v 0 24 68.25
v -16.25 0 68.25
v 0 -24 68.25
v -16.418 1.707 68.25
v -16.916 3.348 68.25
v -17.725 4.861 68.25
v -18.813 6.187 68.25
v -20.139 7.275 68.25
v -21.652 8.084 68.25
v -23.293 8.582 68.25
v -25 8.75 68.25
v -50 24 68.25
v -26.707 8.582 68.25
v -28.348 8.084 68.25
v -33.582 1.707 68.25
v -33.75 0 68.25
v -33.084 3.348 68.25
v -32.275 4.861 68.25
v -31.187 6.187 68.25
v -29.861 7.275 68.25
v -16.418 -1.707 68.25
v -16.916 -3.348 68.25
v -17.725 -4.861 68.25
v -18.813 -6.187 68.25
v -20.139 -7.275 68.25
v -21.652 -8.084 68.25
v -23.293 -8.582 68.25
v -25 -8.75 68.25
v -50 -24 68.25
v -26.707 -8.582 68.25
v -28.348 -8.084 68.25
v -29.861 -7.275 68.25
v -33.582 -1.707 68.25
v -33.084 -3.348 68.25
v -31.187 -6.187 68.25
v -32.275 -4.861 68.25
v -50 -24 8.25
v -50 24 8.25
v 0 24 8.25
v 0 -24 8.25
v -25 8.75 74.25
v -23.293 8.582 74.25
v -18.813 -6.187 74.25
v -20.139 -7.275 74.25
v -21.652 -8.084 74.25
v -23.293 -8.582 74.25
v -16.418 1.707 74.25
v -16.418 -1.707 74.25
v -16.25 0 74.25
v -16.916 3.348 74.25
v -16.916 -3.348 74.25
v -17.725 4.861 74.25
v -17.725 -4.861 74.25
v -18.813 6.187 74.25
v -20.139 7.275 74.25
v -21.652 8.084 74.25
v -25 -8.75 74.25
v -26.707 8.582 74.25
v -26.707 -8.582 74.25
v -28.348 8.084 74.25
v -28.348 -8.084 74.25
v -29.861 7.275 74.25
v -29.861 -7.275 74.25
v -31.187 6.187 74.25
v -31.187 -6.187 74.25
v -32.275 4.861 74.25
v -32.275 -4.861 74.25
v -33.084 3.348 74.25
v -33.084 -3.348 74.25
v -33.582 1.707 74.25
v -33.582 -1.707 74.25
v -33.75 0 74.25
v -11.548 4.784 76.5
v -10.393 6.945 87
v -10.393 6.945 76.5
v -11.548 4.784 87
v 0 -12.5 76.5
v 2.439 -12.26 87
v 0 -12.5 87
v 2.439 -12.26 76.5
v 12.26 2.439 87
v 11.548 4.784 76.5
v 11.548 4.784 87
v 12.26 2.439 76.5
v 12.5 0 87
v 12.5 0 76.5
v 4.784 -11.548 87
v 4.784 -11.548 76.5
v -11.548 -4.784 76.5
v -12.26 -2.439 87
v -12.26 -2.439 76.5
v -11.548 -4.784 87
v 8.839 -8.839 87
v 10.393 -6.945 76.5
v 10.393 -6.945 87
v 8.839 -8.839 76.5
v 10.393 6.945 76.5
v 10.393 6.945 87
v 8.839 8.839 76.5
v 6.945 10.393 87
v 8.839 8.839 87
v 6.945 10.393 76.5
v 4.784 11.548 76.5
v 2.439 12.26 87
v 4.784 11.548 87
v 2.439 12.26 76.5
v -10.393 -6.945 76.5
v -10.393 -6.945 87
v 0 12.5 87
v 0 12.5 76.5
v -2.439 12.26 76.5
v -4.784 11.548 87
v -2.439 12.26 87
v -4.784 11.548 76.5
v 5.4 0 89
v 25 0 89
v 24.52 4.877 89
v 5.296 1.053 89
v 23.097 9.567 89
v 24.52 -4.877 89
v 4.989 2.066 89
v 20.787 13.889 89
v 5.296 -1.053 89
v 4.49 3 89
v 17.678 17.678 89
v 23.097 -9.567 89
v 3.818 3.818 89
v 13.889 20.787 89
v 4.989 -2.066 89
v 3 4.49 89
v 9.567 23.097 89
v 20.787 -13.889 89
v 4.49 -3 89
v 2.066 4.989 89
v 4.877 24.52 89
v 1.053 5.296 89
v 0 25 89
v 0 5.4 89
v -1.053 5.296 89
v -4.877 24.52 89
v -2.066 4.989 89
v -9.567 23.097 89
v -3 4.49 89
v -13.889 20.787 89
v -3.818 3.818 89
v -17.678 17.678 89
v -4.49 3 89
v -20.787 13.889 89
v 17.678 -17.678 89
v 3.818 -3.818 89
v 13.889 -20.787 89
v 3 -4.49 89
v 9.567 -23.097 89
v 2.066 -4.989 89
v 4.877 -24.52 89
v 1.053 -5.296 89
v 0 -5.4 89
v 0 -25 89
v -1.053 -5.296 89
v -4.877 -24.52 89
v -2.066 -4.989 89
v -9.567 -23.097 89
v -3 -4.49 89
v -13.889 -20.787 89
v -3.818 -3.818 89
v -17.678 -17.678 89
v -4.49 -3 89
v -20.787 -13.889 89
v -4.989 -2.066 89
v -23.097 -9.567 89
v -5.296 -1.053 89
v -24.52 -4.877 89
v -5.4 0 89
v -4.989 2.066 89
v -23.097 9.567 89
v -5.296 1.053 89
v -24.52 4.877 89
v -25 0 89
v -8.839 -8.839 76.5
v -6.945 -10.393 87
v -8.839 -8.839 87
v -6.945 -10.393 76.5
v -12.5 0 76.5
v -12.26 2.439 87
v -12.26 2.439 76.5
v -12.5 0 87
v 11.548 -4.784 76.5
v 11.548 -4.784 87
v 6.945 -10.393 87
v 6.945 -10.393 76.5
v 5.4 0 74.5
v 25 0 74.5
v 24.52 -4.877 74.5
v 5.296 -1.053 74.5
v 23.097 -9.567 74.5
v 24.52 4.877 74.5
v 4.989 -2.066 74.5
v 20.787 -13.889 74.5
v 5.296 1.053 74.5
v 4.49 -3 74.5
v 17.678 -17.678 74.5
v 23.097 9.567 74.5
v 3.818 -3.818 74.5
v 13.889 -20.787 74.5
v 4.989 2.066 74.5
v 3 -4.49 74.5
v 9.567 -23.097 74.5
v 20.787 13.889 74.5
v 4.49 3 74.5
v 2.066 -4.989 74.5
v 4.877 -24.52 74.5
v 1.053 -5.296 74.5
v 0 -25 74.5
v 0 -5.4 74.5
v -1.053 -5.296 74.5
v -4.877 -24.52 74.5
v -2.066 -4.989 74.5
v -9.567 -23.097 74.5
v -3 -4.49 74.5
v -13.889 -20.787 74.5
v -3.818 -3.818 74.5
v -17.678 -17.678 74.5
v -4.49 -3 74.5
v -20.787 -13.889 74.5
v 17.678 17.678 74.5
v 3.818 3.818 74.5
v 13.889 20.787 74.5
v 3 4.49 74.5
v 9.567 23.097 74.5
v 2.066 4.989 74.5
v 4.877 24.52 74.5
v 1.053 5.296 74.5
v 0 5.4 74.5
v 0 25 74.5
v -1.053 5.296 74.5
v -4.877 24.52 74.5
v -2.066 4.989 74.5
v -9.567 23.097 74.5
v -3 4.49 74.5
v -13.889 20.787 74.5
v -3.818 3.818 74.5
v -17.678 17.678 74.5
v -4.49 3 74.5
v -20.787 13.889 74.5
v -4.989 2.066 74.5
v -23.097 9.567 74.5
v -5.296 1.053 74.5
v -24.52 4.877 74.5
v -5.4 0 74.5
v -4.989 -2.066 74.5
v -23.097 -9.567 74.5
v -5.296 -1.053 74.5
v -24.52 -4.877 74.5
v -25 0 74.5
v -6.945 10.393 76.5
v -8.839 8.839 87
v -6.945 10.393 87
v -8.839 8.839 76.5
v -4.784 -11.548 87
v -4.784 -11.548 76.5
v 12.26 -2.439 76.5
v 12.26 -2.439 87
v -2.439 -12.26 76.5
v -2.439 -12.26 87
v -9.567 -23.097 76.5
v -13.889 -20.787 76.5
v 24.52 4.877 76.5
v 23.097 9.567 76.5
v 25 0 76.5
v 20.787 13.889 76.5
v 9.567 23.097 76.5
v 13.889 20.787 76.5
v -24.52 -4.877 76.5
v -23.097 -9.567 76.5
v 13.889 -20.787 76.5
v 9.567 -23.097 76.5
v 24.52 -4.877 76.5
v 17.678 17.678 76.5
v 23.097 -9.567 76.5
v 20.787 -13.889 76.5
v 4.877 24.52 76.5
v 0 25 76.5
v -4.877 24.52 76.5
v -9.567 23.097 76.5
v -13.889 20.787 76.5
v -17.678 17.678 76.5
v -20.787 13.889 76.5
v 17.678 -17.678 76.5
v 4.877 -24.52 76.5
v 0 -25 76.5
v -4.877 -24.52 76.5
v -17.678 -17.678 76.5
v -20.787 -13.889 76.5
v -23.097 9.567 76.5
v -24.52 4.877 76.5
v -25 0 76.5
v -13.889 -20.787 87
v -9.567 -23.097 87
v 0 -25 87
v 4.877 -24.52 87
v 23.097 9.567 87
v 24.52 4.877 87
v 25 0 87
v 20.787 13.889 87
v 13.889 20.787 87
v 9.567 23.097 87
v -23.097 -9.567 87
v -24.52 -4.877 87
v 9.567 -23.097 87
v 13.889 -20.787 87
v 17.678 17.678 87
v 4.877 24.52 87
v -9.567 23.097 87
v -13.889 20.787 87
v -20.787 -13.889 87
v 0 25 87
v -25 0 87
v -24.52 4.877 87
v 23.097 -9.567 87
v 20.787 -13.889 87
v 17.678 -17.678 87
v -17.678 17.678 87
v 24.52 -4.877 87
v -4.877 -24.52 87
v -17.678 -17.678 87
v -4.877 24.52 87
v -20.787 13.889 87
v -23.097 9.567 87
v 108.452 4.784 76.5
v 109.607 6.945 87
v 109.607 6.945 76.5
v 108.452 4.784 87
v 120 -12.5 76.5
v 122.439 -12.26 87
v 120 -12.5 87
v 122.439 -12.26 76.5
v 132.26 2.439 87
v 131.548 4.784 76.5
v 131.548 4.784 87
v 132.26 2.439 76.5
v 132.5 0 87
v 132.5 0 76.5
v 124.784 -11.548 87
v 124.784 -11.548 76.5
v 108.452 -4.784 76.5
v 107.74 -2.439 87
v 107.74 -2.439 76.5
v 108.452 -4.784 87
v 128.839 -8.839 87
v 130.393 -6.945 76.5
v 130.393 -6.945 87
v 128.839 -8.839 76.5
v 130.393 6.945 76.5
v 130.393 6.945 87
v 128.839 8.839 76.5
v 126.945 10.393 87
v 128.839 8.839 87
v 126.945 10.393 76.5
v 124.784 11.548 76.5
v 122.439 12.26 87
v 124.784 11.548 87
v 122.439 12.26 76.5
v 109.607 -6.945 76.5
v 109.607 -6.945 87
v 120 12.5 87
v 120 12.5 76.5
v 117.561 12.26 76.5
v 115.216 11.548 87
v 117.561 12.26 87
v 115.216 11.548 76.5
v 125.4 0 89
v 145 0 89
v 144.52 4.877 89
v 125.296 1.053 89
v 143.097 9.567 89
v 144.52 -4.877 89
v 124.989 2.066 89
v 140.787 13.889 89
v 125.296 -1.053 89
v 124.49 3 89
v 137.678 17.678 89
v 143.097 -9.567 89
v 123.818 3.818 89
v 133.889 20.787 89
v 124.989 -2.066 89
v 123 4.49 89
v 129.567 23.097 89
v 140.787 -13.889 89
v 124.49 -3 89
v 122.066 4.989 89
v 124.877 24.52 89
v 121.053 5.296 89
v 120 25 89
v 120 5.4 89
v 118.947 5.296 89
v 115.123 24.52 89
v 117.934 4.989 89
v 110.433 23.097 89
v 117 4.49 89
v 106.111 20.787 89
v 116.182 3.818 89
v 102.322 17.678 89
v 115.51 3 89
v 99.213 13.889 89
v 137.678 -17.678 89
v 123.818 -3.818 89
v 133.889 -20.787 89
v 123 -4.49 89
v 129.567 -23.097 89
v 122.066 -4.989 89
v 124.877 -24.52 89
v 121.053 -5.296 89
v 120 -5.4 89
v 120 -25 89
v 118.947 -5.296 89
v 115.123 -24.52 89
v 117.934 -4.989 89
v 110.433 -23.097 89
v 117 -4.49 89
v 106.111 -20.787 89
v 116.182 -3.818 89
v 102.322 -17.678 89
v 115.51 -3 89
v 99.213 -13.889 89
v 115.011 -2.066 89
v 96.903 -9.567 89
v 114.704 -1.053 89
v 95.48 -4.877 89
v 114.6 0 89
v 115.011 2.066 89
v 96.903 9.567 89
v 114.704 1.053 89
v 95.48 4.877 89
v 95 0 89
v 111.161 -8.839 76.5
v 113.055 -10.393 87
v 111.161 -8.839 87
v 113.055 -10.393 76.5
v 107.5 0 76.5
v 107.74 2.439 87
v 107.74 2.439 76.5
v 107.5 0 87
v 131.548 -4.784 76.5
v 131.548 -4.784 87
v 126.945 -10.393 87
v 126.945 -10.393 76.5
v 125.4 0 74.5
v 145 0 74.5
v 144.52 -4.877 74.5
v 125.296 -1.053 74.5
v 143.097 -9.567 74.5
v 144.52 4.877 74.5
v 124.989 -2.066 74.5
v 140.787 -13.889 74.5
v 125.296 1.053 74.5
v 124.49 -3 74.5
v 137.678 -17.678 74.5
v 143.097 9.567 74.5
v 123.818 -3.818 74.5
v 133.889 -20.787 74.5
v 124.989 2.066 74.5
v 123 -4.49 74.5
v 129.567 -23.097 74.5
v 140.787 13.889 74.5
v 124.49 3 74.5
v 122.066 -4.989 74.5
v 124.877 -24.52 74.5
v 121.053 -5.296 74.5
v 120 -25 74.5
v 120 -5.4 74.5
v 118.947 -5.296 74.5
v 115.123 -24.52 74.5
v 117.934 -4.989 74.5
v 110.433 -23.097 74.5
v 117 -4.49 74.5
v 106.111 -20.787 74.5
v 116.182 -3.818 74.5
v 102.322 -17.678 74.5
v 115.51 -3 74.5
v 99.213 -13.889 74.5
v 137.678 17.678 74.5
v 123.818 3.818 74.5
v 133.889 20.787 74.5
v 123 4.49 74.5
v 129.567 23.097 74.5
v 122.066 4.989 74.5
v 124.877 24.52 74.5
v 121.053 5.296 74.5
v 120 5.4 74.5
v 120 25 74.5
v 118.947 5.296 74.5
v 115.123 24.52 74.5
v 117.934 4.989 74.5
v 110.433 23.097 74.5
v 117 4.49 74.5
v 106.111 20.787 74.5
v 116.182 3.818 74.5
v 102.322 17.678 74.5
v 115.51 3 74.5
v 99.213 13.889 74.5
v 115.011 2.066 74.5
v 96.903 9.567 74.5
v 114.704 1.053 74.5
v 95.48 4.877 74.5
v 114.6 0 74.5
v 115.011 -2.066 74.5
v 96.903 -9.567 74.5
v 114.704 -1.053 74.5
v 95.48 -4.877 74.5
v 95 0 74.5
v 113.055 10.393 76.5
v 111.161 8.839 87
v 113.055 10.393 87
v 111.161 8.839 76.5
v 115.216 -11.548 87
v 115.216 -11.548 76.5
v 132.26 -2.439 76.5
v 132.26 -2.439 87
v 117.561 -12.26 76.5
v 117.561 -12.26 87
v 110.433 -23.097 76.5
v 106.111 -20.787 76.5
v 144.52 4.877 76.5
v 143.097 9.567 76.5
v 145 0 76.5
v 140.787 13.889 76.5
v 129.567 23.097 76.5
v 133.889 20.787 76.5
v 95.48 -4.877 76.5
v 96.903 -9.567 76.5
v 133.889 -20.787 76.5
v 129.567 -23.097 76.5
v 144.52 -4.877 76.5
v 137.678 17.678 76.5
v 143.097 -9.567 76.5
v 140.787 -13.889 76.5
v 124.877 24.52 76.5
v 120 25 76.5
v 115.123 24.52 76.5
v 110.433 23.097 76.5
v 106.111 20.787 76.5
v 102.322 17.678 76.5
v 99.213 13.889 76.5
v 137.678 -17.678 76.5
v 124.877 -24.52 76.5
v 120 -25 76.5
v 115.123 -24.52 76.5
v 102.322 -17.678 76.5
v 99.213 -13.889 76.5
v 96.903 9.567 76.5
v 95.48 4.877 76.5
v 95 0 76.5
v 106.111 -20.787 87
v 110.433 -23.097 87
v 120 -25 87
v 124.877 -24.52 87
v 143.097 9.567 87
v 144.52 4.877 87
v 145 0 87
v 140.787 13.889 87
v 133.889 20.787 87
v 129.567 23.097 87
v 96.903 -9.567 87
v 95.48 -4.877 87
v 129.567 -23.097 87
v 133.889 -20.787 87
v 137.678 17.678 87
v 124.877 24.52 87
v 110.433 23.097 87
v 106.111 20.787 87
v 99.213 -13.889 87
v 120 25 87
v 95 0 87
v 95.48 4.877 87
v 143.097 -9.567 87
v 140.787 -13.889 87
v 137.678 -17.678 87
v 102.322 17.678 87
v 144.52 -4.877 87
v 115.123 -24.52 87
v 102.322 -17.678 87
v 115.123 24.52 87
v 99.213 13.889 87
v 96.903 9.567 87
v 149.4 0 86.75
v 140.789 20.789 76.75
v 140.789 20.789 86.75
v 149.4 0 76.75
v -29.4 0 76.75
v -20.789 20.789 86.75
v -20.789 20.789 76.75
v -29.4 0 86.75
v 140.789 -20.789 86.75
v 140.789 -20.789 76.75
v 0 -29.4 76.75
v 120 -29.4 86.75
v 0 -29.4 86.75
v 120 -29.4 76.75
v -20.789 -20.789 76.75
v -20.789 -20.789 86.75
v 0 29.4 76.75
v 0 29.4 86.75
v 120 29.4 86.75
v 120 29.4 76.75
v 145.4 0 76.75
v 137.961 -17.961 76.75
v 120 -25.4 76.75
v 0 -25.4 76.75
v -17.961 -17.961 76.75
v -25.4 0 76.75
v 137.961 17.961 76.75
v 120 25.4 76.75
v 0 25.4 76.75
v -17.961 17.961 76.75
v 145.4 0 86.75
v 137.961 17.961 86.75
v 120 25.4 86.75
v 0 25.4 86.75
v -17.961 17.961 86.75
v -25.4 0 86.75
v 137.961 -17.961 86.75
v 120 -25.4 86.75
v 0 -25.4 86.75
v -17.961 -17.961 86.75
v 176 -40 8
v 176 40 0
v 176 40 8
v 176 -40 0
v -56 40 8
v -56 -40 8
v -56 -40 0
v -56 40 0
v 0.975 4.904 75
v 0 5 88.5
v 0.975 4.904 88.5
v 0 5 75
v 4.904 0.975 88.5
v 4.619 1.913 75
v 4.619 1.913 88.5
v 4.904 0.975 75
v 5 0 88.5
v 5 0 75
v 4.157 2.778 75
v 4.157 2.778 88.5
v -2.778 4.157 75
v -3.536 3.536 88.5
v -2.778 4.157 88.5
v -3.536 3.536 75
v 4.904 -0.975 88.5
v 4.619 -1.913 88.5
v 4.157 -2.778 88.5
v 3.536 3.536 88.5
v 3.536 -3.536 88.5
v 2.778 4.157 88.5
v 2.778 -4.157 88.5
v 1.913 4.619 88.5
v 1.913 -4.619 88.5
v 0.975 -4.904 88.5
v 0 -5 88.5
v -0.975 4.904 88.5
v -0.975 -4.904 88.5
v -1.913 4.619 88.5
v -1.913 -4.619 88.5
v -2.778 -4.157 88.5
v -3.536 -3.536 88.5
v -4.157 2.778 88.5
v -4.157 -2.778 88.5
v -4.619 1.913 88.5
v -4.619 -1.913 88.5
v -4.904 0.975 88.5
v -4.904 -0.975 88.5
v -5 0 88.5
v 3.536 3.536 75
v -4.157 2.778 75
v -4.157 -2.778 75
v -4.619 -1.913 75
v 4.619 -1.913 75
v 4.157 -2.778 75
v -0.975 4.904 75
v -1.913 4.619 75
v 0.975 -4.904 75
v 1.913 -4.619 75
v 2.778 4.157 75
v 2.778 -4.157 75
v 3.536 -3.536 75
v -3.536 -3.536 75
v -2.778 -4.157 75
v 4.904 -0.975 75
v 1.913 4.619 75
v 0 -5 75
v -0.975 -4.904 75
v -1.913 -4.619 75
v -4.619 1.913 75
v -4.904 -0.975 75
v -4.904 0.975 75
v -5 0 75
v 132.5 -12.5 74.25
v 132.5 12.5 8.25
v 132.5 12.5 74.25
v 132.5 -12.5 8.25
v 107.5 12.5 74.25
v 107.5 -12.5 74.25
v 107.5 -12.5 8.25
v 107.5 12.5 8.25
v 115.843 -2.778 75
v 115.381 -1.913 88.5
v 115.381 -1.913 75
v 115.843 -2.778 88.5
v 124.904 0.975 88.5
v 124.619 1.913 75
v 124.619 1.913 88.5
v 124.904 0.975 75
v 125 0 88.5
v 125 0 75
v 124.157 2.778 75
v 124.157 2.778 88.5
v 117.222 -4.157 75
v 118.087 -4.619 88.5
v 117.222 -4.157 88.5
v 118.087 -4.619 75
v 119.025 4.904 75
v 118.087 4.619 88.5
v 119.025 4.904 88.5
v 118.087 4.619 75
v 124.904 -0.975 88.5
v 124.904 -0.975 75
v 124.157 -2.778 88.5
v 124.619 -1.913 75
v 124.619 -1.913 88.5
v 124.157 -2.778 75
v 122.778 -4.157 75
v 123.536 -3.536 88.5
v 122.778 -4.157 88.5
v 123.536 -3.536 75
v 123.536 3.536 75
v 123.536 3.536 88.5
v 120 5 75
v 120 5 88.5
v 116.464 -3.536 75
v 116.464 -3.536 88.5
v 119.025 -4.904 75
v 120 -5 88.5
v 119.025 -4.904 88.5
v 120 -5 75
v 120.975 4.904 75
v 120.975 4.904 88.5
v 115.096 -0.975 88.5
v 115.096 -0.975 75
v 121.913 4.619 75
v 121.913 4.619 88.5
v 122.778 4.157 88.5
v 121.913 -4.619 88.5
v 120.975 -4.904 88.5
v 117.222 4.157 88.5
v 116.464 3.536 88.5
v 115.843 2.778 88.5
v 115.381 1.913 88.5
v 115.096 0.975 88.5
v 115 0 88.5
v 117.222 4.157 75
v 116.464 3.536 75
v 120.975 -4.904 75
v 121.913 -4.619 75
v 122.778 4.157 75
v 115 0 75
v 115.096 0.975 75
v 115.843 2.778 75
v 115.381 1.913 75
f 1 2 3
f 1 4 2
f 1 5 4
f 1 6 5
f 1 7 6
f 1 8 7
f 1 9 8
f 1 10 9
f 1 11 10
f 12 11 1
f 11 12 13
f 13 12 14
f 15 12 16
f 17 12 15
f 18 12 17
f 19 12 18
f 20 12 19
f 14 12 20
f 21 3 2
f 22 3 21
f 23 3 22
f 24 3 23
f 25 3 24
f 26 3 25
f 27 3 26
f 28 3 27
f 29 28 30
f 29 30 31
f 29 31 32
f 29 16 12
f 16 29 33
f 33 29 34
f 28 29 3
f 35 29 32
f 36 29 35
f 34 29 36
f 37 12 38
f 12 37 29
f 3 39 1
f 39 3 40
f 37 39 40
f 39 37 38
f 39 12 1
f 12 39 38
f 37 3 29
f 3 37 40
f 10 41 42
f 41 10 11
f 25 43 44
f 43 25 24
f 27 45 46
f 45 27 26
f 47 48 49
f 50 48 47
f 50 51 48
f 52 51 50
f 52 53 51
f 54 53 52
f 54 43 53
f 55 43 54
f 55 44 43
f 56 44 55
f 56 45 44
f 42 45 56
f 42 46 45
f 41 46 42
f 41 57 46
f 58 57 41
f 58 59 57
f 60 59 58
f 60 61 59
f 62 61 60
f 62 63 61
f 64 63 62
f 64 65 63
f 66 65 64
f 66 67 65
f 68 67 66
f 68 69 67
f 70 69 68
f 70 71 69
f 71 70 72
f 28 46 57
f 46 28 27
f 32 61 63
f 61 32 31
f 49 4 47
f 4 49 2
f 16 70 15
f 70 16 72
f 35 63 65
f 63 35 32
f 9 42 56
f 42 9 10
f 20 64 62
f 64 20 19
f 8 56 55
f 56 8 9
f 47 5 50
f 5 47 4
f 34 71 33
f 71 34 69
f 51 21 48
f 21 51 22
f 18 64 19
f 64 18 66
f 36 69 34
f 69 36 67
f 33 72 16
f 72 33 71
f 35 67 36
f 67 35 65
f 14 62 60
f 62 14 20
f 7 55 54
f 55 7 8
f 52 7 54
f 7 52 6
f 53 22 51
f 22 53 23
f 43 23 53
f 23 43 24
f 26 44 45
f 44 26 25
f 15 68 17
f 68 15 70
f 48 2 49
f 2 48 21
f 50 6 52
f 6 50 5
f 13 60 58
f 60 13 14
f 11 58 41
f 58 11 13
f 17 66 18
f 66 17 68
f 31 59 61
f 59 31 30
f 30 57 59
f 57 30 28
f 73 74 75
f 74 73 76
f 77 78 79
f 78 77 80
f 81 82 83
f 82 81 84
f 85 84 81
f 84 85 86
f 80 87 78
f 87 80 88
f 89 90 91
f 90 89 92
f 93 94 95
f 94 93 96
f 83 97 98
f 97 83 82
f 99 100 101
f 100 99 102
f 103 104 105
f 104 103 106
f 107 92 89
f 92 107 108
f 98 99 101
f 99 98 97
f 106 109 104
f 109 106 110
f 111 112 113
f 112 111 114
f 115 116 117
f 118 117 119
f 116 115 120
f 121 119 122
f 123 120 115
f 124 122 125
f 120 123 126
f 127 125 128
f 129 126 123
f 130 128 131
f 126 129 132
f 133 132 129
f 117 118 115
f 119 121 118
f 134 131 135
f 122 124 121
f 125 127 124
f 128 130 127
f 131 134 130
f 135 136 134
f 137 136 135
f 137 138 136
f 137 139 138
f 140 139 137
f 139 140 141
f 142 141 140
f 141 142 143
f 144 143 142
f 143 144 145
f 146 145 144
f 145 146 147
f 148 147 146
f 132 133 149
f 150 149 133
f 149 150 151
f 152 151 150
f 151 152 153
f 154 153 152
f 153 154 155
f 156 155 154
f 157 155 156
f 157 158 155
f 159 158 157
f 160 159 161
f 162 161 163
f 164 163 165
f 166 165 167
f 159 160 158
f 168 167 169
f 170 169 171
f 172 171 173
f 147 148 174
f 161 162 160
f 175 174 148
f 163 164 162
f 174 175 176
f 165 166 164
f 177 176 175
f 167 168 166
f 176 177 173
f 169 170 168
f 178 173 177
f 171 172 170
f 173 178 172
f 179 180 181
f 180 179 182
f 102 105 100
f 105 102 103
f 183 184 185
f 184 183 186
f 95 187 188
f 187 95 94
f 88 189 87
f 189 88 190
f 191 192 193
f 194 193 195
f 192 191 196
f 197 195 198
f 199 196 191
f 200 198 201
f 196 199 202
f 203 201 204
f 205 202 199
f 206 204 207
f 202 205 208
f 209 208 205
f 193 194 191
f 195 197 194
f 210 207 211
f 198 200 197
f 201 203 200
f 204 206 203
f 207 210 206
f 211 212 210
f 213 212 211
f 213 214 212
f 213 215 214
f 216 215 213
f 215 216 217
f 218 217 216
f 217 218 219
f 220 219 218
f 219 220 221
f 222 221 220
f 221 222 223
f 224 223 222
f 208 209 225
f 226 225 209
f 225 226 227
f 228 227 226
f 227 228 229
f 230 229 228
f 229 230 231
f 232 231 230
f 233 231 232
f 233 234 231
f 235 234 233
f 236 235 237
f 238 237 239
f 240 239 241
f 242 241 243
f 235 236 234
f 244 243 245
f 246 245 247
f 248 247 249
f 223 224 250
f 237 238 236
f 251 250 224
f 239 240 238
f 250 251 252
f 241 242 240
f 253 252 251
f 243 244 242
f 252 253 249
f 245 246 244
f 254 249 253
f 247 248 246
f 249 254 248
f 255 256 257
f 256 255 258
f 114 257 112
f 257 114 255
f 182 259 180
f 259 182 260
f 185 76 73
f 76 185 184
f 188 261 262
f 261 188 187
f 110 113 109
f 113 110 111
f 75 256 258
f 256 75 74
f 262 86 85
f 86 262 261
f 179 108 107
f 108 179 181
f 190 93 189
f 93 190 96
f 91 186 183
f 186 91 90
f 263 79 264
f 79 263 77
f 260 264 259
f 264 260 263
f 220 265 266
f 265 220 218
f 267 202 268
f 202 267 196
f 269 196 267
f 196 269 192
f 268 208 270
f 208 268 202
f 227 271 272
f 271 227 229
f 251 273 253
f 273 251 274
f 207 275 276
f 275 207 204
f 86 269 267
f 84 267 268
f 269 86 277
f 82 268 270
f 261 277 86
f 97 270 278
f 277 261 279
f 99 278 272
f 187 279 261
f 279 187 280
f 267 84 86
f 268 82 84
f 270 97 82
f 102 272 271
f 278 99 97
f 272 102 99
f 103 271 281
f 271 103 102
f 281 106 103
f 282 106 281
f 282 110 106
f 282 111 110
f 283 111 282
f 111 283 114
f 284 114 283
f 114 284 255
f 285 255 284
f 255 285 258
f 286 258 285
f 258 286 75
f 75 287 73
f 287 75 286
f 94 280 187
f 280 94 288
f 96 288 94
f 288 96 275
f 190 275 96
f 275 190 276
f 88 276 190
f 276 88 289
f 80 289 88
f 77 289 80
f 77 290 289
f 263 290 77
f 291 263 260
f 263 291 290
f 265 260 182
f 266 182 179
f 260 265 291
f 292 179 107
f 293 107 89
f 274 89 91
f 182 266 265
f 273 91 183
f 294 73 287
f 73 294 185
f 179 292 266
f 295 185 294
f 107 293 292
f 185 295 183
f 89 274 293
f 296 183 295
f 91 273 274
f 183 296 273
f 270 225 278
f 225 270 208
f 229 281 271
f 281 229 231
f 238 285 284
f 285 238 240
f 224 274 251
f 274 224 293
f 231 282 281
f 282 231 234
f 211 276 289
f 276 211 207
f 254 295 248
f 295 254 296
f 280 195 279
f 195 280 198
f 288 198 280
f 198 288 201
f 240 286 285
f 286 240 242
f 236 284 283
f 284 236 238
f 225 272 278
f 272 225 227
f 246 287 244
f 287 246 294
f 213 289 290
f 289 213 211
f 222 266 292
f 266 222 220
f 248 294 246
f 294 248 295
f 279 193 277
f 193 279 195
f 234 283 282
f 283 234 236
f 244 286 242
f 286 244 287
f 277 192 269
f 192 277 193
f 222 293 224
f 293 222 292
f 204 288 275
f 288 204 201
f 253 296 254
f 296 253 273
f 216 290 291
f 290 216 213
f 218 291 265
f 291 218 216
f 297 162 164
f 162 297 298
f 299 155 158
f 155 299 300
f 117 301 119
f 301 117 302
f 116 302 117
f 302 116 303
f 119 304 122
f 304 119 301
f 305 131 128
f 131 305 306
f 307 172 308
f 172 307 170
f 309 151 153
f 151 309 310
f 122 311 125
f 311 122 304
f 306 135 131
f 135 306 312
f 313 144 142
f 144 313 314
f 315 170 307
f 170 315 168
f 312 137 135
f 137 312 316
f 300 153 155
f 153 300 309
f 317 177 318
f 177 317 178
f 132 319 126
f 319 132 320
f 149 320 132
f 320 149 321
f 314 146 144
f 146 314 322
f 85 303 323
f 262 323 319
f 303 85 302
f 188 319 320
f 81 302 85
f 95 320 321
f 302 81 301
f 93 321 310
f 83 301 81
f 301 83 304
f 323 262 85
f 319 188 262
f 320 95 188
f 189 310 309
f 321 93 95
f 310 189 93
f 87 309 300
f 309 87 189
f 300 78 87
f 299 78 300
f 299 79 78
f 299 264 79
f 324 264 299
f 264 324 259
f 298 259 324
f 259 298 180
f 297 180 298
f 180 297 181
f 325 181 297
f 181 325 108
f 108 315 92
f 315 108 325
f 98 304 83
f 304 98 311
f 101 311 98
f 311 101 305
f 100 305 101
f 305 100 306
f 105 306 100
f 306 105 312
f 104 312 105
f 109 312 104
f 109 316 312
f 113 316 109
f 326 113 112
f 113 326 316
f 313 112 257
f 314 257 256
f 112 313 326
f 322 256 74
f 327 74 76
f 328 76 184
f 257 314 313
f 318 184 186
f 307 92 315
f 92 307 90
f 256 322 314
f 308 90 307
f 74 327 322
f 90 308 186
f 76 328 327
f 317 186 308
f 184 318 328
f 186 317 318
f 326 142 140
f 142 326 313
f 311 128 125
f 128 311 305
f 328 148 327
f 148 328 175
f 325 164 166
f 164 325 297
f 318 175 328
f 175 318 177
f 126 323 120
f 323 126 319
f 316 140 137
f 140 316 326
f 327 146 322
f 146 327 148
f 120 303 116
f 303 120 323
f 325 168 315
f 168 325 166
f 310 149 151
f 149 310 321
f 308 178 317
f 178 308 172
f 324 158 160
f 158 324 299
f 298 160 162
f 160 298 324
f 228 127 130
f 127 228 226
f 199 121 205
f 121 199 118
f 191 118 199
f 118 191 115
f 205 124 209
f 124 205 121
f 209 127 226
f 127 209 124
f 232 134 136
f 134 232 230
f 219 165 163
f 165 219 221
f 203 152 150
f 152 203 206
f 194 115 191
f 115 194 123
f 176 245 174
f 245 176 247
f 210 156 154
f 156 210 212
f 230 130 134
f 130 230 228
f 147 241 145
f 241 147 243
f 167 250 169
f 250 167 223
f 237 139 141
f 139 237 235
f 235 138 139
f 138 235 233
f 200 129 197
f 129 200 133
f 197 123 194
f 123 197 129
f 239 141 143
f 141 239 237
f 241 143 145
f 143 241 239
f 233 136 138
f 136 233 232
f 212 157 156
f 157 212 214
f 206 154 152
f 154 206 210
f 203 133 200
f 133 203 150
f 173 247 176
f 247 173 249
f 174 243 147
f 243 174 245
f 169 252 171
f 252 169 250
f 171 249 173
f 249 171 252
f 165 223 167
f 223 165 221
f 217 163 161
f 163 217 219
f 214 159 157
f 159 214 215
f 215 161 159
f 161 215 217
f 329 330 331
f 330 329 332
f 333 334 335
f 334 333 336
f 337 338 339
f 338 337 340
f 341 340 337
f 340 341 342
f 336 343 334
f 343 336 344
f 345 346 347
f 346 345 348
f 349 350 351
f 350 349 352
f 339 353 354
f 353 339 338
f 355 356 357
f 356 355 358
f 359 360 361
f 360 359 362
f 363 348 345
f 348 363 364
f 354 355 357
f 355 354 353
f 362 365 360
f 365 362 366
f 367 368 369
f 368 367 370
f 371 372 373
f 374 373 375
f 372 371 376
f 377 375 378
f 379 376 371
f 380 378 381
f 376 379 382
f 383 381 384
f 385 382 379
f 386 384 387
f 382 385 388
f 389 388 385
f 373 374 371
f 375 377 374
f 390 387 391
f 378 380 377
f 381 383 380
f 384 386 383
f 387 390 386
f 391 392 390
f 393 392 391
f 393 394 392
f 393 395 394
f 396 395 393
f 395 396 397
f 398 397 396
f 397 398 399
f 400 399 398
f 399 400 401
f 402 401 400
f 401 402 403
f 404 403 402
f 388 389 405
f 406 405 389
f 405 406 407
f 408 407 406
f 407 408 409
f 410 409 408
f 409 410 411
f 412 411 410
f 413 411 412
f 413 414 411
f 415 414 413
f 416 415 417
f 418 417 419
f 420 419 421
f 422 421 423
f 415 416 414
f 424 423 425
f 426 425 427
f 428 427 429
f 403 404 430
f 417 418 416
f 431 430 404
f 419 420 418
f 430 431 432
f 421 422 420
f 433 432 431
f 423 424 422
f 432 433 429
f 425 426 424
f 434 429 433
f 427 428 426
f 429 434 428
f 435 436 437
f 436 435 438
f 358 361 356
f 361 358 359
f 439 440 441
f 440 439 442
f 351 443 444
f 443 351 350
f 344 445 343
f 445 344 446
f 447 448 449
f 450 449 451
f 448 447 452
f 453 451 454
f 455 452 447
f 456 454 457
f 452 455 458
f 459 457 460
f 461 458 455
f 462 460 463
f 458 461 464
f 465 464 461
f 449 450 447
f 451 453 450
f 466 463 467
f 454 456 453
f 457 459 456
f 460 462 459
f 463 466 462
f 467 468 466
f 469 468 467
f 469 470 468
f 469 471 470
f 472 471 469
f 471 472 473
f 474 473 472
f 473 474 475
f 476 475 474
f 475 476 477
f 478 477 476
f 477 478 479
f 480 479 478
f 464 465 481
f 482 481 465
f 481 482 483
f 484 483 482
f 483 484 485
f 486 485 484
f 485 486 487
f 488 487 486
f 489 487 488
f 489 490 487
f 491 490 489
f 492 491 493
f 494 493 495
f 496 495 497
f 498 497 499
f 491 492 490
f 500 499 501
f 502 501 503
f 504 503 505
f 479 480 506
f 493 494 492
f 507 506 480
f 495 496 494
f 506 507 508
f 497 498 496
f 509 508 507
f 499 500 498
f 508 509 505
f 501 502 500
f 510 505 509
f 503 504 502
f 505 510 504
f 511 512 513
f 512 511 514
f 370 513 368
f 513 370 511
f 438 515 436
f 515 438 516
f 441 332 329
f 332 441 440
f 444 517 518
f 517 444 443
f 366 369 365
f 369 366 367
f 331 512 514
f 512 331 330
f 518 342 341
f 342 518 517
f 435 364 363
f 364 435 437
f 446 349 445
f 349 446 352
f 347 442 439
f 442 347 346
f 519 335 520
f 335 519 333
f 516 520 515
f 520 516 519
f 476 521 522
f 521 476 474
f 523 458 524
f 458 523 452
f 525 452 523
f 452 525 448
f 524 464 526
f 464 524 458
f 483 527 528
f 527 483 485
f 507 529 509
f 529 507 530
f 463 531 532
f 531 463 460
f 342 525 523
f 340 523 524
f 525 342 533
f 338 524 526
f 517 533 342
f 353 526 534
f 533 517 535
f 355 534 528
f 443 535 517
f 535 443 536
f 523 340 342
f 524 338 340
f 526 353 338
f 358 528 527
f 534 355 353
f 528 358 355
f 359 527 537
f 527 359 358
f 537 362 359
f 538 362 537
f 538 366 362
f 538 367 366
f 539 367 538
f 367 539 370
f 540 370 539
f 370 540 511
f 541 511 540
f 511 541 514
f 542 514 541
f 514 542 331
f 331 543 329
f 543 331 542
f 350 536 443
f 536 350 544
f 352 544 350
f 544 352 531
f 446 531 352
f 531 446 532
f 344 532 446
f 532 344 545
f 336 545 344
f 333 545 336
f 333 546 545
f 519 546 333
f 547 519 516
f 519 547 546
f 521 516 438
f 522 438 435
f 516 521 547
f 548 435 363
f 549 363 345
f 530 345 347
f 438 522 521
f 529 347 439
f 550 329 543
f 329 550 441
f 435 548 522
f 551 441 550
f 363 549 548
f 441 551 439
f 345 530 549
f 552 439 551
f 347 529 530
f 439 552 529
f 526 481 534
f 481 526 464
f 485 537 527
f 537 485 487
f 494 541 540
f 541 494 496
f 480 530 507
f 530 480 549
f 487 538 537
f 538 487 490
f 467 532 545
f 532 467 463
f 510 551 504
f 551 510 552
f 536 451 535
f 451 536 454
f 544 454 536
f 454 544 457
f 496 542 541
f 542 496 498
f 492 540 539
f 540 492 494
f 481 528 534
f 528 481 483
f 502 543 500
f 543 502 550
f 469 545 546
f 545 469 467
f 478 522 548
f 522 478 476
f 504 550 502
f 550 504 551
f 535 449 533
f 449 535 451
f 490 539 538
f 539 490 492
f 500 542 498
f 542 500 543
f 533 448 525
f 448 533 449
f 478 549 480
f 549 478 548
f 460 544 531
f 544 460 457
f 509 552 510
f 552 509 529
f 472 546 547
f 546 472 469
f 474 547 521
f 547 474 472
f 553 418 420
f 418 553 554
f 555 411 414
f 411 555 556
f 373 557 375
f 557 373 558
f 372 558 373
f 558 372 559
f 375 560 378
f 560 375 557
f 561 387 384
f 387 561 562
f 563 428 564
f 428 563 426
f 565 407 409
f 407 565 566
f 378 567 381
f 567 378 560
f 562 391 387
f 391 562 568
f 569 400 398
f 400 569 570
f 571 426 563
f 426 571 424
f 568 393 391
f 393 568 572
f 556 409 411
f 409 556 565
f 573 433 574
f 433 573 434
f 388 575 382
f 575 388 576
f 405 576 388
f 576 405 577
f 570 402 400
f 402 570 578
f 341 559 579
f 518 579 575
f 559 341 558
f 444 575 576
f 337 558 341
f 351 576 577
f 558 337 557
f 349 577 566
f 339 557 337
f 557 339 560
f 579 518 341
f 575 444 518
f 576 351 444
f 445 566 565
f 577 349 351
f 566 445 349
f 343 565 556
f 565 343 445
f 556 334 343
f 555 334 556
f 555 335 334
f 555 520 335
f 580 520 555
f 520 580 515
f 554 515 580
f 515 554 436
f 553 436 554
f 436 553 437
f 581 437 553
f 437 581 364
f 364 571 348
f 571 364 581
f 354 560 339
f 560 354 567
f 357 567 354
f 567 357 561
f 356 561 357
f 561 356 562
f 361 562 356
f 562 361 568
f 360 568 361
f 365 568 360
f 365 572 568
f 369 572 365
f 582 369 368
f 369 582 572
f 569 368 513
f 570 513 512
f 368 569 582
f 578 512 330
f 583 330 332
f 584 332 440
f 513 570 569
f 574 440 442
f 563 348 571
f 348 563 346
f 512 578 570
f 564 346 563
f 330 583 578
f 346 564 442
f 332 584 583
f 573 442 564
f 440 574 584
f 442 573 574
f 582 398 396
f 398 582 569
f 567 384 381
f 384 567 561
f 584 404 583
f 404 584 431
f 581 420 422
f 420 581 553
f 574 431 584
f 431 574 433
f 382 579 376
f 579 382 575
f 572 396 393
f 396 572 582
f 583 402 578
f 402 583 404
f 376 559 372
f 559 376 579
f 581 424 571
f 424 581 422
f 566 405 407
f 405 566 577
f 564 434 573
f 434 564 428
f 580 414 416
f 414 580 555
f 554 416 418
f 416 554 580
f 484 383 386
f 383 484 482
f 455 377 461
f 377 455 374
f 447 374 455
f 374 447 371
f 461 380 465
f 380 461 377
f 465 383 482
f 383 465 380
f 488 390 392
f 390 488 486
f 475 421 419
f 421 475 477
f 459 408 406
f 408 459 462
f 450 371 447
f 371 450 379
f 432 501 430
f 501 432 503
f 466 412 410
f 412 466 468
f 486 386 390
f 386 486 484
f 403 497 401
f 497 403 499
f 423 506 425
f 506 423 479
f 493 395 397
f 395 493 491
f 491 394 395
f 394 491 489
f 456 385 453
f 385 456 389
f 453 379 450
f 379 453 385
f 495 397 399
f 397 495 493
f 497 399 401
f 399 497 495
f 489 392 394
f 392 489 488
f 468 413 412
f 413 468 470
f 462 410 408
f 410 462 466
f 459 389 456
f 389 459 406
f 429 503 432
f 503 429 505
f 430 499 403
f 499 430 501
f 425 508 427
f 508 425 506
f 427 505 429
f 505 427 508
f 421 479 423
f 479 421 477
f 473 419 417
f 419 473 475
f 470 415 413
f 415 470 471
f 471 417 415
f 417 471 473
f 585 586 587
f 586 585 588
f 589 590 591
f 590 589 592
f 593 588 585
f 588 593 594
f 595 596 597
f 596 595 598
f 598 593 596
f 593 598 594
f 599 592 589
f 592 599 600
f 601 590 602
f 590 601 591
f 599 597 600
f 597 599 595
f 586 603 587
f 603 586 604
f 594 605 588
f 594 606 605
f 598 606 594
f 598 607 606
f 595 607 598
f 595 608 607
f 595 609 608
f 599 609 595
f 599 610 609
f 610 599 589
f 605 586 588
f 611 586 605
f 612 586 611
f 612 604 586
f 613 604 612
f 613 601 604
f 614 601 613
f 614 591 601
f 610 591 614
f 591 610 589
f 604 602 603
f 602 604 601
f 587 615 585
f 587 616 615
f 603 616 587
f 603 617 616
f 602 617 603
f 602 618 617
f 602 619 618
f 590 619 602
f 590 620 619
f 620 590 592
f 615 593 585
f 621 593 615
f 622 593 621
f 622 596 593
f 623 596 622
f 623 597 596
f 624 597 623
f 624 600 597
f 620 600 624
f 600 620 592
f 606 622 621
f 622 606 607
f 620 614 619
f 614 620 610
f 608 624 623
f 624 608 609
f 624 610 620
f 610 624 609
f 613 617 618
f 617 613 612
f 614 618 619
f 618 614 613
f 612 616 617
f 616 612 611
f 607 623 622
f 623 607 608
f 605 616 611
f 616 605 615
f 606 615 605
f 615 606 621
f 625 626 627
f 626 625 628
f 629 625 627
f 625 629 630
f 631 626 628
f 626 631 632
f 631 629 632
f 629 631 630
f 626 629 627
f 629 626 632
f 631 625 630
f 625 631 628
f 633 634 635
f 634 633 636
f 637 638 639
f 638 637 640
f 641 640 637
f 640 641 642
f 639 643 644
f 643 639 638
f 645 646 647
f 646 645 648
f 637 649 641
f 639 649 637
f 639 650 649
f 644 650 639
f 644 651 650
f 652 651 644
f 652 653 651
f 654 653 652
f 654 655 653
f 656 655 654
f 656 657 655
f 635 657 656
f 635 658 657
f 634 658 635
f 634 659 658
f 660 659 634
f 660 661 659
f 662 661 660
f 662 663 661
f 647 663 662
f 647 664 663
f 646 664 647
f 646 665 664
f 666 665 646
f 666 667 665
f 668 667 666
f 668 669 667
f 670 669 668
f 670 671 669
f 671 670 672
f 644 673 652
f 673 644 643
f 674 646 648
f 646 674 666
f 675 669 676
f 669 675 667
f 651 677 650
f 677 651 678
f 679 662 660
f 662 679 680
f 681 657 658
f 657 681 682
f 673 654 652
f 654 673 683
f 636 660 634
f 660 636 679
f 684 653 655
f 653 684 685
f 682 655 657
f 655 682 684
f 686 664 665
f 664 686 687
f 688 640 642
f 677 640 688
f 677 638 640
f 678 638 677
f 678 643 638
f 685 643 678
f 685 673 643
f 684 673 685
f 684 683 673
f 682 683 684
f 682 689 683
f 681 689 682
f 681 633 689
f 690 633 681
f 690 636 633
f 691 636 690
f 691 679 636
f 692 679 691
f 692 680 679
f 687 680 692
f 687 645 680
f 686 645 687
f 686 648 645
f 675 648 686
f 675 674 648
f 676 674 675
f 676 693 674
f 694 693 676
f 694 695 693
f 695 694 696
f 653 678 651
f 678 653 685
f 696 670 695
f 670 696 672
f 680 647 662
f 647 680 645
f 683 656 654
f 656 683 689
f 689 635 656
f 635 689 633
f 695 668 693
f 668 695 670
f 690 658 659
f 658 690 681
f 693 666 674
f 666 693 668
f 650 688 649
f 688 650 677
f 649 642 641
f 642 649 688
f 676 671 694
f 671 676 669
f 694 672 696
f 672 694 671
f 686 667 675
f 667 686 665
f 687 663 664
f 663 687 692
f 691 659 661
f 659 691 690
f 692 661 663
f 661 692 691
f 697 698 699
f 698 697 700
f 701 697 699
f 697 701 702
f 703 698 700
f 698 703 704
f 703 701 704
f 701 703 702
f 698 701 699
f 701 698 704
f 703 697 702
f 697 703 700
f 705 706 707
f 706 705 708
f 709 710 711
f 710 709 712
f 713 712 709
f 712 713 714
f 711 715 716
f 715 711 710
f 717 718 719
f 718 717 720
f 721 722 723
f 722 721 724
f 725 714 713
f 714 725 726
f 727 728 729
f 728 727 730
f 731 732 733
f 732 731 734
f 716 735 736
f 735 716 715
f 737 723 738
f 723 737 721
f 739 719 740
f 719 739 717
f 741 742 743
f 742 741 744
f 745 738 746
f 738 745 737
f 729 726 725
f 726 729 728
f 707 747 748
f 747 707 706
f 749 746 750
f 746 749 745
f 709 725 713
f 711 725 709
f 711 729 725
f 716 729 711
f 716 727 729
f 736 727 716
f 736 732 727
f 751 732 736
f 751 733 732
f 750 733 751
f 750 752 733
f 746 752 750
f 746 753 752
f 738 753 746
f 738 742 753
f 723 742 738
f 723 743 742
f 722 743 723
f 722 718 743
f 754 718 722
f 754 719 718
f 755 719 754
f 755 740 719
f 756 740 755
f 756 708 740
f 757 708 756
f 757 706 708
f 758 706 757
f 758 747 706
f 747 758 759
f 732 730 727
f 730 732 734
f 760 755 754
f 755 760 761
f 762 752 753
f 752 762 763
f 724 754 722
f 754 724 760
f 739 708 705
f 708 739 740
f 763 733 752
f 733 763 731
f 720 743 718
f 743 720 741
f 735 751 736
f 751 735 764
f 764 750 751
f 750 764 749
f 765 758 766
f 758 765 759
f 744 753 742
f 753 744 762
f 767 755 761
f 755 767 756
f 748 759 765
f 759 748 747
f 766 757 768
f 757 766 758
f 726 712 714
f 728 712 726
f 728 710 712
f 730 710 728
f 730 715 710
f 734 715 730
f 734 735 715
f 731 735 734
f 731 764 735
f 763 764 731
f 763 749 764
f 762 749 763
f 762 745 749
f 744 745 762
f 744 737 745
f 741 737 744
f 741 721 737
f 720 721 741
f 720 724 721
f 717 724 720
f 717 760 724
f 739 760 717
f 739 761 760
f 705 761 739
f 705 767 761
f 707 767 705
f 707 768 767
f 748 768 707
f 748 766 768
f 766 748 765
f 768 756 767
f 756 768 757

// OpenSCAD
$fn = 32;

// ------------------------------------------------------------------------
// Motor belt drive: span 120 mm, pulleys d50, belt 10 mm wide
// Every part is its own module, assembly() places every instance.
// ------------------------------------------------------------------------

// --- part 1 ---
module base_plate() {
  difference() {
    translate([-116, -40, 0]) cube([232, 80, 8]);
  }
}

// --- part 2 ---
module motor() {
  union() {
    translate([-30, -24, 0]) cube([60, 48, 50]);
    translate([33, 0, 25]) rotate([0, 90, 0]) cylinder(h = 6, d = 17.5, center = true);
  }
}

// --- part 3 ---
module drive_shaft() {
  translate([0, 0, -6.75]) cylinder(h = 13.5, d = 10);
}

// --- part 4 ---
module pulley_drive() {
  difference() {
    union() {
      cylinder(h = 14.5, d = 25);
      cylinder(h = 2, d = 50);
      translate([0, 0, 12.5]) cylinder(h = 2, d = 50);
    }
    translate([0, 0, -1]) cylinder(h = 16.5, d = 10.8);
  }
}

// --- part 5 ---
module idler_post() {
  translate([-12.5, -12.5, 0]) cube([25, 25, 66]);
}

// --- part 6 ---
module driven_shaft() {
  translate([0, 0, -6.75]) cylinder(h = 13.5, d = 10);
}

// --- part 7 ---
module pulley_driven() {
  difference() {
    union() {
      cylinder(h = 14.5, d = 25);
      cylinder(h = 2, d = 50);
      translate([0, 0, 12.5]) cylinder(h = 2, d = 50);
    }
    translate([0, 0, -1]) cylinder(h = 16.5, d = 10.8);
  }
}

// --- part 8 ---
module drive_belt() {
  difference() {
    linear_extrude(height = 10) polygon(points = concat([for (a = [90 : 45 : 270]) [29.4 * cos(a), 29.4 * sin(a)]], [for (a = [270 : 45 : 450]) [120 + 29.4 * cos(a), 29.4 * sin(a)]]));
    translate([0, 0, -1]) linear_extrude(height = 12) polygon(points = concat([for (a = [90 : 45 : 270]) [25.4 * cos(a), 25.4 * sin(a)]], [for (a = [270 : 45 : 450]) [120 + 25.4 * cos(a), 25.4 * sin(a)]]));
  }
}

// --- assembly ---
module assembly() {
  color([0.80, 0.24, 0.20]) translate([60, 0, 0]) rotate([0, 0, 0]) base_plate();
  color([0.20, 0.45, 0.75]) translate([0, 0, 38.25]) rotate([0, 270, 0]) motor();
  color([0.25, 0.62, 0.32]) translate([0, 0, 81.75]) rotate([0, 0, 0]) drive_shaft();
  color([0.92, 0.70, 0.18]) translate([0, 0, 74.5]) rotate([0, 0, 0]) pulley_drive();
  color([0.58, 0.35, 0.70]) translate([120, 0, 8.25]) rotate([0, 0, 0]) idler_post();
  color([0.16, 0.66, 0.66]) translate([120, 0, 81.75]) rotate([0, 0, 0]) driven_shaft();
  color([0.85, 0.48, 0.18]) translate([120, 0, 74.5]) rotate([0, 0, 0]) pulley_driven();
  color([0.55, 0.60, 0.65]) translate([0, 0, 76.75]) rotate([0, 0, 0]) drive_belt();
}

assembly();
